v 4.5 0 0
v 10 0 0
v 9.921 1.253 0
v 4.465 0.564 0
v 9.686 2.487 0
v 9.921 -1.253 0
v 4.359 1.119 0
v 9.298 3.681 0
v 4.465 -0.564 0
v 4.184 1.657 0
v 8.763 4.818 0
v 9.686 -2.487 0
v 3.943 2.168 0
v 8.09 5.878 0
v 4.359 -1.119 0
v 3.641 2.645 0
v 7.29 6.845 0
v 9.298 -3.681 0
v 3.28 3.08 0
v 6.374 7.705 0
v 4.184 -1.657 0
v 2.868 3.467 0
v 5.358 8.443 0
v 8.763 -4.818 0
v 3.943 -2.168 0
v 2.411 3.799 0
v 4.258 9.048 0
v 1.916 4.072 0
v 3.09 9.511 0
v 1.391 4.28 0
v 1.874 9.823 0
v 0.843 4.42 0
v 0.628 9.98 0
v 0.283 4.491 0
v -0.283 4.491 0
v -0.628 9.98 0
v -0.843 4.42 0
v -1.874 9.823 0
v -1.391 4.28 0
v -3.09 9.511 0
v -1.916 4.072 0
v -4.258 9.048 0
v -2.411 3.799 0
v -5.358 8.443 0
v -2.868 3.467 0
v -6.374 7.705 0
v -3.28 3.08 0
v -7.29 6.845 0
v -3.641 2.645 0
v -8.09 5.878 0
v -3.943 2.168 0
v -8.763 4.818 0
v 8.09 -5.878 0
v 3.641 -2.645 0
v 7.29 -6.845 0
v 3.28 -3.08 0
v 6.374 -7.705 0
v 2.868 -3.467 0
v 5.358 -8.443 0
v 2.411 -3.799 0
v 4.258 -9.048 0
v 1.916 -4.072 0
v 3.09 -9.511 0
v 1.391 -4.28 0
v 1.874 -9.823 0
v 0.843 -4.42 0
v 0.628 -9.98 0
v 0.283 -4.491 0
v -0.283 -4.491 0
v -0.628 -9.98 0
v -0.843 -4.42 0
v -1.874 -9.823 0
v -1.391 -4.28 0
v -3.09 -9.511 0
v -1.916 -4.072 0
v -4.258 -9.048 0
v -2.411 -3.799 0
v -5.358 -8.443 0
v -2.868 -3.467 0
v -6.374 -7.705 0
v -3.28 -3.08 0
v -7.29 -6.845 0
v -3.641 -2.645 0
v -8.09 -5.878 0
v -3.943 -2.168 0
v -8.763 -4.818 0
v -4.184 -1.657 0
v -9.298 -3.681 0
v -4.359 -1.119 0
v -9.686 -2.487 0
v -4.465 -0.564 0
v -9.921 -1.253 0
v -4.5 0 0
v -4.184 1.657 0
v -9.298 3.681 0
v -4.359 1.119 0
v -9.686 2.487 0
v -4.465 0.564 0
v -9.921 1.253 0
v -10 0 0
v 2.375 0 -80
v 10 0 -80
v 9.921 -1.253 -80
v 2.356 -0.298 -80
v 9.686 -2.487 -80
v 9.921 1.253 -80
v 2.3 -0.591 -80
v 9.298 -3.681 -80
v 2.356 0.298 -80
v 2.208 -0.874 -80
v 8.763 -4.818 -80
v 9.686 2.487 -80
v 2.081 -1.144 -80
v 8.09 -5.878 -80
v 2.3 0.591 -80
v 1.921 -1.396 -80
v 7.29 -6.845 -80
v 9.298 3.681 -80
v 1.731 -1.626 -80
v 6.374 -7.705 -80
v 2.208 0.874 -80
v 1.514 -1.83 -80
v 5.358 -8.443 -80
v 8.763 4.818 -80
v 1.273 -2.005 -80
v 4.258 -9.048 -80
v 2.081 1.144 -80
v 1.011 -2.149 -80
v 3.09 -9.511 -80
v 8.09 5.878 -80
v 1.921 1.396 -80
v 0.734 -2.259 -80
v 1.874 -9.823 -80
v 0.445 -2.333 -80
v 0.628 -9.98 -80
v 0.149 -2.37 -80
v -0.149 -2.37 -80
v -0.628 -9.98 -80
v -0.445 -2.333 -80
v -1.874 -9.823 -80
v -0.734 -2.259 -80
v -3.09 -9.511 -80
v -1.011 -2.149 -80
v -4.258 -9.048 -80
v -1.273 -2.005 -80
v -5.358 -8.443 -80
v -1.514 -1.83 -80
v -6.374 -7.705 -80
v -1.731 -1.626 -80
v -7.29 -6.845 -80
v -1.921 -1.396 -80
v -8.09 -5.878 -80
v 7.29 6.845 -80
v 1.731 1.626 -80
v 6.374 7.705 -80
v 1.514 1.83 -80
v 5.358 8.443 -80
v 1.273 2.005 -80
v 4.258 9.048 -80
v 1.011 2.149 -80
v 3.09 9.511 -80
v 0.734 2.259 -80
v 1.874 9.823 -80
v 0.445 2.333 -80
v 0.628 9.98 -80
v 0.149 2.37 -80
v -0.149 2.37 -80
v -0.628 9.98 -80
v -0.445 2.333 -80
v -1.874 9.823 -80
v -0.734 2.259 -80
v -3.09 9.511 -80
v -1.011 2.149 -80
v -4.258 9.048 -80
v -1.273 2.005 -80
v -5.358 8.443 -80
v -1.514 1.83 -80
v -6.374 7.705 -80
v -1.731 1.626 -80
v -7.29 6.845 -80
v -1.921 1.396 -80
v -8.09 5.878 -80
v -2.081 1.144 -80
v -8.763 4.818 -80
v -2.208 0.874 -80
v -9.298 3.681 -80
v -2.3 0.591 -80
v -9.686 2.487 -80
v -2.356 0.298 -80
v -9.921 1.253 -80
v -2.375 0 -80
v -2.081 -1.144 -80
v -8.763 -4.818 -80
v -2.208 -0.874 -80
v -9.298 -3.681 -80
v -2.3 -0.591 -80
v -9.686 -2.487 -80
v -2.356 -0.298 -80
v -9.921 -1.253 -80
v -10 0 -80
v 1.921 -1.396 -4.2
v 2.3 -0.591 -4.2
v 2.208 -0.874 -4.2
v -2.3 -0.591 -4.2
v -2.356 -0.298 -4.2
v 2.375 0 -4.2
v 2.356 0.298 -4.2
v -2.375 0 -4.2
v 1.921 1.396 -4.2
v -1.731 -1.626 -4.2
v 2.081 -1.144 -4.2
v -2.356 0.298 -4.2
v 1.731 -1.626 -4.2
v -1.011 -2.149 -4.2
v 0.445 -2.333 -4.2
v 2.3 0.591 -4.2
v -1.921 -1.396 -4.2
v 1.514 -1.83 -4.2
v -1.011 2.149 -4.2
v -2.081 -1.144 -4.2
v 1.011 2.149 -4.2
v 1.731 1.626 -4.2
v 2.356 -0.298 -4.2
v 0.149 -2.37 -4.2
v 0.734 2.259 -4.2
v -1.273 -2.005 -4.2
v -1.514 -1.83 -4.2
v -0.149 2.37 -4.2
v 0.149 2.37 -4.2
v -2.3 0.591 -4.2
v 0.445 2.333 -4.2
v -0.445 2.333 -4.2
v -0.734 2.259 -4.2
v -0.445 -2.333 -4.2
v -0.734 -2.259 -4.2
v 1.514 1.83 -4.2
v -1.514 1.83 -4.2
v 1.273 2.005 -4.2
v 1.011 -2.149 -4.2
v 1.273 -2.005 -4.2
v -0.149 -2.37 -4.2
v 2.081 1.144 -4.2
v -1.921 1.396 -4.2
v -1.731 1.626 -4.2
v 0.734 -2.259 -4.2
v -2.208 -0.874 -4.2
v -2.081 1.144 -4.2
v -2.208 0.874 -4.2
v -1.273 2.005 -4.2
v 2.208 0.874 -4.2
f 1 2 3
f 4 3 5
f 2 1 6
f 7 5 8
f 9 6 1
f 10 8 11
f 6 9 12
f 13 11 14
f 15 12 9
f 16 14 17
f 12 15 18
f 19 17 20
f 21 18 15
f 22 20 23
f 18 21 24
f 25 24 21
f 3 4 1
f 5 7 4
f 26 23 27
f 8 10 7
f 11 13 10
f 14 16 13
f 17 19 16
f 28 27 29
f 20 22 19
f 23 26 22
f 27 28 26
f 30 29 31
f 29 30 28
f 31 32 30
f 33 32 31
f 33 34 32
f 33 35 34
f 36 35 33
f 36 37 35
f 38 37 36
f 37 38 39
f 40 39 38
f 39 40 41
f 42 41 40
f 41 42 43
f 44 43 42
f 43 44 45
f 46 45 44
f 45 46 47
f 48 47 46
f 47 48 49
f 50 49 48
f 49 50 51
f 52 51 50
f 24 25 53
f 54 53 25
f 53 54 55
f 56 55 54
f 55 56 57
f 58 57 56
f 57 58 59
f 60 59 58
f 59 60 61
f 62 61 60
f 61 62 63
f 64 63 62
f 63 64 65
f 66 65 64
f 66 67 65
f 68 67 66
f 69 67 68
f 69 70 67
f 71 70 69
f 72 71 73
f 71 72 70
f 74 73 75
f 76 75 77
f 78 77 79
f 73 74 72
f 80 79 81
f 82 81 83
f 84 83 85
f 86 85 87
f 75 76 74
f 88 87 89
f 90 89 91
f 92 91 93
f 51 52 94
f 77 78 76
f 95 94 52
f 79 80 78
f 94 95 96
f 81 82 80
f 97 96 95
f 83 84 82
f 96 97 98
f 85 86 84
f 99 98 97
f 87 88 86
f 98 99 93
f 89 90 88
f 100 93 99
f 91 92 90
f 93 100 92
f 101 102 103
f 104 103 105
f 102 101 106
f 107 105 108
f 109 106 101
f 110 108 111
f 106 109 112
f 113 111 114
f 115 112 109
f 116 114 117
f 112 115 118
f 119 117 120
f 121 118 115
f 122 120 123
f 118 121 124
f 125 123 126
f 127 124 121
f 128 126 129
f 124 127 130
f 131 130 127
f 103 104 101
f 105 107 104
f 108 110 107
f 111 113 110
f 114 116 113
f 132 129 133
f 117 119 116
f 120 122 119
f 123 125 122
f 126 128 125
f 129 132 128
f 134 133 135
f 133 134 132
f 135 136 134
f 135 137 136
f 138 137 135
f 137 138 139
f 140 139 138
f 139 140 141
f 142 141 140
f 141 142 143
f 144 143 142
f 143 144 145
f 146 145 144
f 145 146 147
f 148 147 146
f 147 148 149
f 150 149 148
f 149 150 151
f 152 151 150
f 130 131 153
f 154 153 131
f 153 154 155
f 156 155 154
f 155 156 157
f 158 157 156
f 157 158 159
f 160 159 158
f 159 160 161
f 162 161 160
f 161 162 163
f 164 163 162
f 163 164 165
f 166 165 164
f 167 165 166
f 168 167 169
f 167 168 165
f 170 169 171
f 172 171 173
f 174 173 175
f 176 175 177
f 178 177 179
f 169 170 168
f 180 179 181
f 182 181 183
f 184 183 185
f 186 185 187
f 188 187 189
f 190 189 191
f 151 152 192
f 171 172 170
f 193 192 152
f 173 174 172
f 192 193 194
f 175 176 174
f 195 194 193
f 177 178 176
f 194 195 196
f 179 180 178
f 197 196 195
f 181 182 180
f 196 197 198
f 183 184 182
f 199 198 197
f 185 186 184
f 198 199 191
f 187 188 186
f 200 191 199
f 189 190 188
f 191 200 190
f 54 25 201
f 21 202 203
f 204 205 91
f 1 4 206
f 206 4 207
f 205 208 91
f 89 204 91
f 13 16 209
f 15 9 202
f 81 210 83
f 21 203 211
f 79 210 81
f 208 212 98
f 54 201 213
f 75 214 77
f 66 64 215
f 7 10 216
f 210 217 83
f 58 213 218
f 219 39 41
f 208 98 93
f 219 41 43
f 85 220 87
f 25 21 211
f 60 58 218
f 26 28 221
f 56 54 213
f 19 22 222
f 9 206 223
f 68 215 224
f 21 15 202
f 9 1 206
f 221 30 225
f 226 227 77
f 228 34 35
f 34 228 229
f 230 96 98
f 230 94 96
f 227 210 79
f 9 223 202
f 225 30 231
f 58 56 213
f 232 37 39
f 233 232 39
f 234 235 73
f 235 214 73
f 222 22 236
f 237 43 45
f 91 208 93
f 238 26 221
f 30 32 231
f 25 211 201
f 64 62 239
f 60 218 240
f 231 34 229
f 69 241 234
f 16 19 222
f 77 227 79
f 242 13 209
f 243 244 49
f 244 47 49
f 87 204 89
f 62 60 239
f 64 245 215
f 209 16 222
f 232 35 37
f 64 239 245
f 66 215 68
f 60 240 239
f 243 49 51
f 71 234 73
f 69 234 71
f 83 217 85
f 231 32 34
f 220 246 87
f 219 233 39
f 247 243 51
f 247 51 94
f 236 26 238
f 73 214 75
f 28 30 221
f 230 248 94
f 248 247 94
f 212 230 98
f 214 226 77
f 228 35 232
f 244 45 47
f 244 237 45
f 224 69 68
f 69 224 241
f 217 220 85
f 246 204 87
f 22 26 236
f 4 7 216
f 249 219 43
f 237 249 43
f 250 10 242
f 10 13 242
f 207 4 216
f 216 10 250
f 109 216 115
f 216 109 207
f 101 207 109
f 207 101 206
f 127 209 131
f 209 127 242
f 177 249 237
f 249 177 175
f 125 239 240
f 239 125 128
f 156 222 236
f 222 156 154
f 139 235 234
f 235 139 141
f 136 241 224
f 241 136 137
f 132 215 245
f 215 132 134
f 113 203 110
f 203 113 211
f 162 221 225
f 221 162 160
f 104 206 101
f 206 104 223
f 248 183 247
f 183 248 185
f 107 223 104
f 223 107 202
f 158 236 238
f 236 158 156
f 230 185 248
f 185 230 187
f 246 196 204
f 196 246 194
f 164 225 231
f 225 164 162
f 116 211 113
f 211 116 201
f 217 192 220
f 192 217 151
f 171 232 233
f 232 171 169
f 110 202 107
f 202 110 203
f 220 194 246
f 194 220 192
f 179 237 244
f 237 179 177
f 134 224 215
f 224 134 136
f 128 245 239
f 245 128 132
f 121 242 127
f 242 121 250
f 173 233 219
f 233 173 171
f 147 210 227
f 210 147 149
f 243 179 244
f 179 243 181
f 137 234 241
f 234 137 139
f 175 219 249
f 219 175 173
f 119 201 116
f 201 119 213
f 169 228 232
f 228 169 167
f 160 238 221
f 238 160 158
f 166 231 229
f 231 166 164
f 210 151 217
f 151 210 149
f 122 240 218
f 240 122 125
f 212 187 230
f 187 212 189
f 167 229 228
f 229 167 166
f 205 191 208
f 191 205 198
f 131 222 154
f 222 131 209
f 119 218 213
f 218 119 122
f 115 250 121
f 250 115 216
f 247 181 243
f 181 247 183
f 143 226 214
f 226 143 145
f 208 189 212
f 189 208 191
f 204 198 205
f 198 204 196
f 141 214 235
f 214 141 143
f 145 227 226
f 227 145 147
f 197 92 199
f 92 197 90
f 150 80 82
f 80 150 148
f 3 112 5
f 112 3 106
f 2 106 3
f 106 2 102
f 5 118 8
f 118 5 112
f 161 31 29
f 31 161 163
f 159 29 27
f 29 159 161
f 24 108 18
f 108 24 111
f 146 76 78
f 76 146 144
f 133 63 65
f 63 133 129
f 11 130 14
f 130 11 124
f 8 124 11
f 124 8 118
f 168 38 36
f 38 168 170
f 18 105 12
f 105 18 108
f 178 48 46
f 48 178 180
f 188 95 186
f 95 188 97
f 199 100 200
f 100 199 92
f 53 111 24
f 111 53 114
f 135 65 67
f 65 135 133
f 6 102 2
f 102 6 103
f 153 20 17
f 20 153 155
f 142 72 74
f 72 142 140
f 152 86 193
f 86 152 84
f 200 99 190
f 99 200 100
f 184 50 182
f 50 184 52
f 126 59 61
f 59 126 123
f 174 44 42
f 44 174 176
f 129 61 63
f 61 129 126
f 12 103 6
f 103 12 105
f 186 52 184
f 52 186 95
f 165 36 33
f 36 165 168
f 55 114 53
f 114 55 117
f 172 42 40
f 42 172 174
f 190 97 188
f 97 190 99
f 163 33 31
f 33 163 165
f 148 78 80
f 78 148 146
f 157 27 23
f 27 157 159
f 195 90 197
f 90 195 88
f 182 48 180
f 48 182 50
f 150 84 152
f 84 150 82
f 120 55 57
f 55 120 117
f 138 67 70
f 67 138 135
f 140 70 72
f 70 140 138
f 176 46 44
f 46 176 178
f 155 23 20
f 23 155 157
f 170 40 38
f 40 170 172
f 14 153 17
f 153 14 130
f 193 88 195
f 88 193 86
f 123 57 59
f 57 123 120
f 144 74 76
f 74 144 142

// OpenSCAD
$fn = 50;


difference() {
	union() {
		translate(v = [0, 0, -80.0000000000]) {
			cylinder(h = 80, r = 10.0000000000);
		}
		cylinder(h = 0, r = 19.0000000000);
	}
	union() {
		translate(v = [0, 0, 0]) {
			rotate(a = [0, 0, 0]) {
				difference() {
					union() {
						#translate(v = [0, 0, -80.0000000000]) {
							cylinder(h = 80, r = 2.2500000000);
						}
						#translate(v = [0, 0, -4.2000000000]) {
							cylinder(h = 4.2000000000, r = 10.0000000000, r1 = 2.3750000000, r2 = 4.5000000000);
						}
						#translate(v = [0, 0, -80.0000000000]) {
							cylinder(h = 80, r = 2.3750000000);
						}
						#translate(v = [0, 0, -80.0000000000]) {
							cylinder(h = 80, r = 2.2500000000);
						}
					}
					union();
				}
			}
		}
	}
}
